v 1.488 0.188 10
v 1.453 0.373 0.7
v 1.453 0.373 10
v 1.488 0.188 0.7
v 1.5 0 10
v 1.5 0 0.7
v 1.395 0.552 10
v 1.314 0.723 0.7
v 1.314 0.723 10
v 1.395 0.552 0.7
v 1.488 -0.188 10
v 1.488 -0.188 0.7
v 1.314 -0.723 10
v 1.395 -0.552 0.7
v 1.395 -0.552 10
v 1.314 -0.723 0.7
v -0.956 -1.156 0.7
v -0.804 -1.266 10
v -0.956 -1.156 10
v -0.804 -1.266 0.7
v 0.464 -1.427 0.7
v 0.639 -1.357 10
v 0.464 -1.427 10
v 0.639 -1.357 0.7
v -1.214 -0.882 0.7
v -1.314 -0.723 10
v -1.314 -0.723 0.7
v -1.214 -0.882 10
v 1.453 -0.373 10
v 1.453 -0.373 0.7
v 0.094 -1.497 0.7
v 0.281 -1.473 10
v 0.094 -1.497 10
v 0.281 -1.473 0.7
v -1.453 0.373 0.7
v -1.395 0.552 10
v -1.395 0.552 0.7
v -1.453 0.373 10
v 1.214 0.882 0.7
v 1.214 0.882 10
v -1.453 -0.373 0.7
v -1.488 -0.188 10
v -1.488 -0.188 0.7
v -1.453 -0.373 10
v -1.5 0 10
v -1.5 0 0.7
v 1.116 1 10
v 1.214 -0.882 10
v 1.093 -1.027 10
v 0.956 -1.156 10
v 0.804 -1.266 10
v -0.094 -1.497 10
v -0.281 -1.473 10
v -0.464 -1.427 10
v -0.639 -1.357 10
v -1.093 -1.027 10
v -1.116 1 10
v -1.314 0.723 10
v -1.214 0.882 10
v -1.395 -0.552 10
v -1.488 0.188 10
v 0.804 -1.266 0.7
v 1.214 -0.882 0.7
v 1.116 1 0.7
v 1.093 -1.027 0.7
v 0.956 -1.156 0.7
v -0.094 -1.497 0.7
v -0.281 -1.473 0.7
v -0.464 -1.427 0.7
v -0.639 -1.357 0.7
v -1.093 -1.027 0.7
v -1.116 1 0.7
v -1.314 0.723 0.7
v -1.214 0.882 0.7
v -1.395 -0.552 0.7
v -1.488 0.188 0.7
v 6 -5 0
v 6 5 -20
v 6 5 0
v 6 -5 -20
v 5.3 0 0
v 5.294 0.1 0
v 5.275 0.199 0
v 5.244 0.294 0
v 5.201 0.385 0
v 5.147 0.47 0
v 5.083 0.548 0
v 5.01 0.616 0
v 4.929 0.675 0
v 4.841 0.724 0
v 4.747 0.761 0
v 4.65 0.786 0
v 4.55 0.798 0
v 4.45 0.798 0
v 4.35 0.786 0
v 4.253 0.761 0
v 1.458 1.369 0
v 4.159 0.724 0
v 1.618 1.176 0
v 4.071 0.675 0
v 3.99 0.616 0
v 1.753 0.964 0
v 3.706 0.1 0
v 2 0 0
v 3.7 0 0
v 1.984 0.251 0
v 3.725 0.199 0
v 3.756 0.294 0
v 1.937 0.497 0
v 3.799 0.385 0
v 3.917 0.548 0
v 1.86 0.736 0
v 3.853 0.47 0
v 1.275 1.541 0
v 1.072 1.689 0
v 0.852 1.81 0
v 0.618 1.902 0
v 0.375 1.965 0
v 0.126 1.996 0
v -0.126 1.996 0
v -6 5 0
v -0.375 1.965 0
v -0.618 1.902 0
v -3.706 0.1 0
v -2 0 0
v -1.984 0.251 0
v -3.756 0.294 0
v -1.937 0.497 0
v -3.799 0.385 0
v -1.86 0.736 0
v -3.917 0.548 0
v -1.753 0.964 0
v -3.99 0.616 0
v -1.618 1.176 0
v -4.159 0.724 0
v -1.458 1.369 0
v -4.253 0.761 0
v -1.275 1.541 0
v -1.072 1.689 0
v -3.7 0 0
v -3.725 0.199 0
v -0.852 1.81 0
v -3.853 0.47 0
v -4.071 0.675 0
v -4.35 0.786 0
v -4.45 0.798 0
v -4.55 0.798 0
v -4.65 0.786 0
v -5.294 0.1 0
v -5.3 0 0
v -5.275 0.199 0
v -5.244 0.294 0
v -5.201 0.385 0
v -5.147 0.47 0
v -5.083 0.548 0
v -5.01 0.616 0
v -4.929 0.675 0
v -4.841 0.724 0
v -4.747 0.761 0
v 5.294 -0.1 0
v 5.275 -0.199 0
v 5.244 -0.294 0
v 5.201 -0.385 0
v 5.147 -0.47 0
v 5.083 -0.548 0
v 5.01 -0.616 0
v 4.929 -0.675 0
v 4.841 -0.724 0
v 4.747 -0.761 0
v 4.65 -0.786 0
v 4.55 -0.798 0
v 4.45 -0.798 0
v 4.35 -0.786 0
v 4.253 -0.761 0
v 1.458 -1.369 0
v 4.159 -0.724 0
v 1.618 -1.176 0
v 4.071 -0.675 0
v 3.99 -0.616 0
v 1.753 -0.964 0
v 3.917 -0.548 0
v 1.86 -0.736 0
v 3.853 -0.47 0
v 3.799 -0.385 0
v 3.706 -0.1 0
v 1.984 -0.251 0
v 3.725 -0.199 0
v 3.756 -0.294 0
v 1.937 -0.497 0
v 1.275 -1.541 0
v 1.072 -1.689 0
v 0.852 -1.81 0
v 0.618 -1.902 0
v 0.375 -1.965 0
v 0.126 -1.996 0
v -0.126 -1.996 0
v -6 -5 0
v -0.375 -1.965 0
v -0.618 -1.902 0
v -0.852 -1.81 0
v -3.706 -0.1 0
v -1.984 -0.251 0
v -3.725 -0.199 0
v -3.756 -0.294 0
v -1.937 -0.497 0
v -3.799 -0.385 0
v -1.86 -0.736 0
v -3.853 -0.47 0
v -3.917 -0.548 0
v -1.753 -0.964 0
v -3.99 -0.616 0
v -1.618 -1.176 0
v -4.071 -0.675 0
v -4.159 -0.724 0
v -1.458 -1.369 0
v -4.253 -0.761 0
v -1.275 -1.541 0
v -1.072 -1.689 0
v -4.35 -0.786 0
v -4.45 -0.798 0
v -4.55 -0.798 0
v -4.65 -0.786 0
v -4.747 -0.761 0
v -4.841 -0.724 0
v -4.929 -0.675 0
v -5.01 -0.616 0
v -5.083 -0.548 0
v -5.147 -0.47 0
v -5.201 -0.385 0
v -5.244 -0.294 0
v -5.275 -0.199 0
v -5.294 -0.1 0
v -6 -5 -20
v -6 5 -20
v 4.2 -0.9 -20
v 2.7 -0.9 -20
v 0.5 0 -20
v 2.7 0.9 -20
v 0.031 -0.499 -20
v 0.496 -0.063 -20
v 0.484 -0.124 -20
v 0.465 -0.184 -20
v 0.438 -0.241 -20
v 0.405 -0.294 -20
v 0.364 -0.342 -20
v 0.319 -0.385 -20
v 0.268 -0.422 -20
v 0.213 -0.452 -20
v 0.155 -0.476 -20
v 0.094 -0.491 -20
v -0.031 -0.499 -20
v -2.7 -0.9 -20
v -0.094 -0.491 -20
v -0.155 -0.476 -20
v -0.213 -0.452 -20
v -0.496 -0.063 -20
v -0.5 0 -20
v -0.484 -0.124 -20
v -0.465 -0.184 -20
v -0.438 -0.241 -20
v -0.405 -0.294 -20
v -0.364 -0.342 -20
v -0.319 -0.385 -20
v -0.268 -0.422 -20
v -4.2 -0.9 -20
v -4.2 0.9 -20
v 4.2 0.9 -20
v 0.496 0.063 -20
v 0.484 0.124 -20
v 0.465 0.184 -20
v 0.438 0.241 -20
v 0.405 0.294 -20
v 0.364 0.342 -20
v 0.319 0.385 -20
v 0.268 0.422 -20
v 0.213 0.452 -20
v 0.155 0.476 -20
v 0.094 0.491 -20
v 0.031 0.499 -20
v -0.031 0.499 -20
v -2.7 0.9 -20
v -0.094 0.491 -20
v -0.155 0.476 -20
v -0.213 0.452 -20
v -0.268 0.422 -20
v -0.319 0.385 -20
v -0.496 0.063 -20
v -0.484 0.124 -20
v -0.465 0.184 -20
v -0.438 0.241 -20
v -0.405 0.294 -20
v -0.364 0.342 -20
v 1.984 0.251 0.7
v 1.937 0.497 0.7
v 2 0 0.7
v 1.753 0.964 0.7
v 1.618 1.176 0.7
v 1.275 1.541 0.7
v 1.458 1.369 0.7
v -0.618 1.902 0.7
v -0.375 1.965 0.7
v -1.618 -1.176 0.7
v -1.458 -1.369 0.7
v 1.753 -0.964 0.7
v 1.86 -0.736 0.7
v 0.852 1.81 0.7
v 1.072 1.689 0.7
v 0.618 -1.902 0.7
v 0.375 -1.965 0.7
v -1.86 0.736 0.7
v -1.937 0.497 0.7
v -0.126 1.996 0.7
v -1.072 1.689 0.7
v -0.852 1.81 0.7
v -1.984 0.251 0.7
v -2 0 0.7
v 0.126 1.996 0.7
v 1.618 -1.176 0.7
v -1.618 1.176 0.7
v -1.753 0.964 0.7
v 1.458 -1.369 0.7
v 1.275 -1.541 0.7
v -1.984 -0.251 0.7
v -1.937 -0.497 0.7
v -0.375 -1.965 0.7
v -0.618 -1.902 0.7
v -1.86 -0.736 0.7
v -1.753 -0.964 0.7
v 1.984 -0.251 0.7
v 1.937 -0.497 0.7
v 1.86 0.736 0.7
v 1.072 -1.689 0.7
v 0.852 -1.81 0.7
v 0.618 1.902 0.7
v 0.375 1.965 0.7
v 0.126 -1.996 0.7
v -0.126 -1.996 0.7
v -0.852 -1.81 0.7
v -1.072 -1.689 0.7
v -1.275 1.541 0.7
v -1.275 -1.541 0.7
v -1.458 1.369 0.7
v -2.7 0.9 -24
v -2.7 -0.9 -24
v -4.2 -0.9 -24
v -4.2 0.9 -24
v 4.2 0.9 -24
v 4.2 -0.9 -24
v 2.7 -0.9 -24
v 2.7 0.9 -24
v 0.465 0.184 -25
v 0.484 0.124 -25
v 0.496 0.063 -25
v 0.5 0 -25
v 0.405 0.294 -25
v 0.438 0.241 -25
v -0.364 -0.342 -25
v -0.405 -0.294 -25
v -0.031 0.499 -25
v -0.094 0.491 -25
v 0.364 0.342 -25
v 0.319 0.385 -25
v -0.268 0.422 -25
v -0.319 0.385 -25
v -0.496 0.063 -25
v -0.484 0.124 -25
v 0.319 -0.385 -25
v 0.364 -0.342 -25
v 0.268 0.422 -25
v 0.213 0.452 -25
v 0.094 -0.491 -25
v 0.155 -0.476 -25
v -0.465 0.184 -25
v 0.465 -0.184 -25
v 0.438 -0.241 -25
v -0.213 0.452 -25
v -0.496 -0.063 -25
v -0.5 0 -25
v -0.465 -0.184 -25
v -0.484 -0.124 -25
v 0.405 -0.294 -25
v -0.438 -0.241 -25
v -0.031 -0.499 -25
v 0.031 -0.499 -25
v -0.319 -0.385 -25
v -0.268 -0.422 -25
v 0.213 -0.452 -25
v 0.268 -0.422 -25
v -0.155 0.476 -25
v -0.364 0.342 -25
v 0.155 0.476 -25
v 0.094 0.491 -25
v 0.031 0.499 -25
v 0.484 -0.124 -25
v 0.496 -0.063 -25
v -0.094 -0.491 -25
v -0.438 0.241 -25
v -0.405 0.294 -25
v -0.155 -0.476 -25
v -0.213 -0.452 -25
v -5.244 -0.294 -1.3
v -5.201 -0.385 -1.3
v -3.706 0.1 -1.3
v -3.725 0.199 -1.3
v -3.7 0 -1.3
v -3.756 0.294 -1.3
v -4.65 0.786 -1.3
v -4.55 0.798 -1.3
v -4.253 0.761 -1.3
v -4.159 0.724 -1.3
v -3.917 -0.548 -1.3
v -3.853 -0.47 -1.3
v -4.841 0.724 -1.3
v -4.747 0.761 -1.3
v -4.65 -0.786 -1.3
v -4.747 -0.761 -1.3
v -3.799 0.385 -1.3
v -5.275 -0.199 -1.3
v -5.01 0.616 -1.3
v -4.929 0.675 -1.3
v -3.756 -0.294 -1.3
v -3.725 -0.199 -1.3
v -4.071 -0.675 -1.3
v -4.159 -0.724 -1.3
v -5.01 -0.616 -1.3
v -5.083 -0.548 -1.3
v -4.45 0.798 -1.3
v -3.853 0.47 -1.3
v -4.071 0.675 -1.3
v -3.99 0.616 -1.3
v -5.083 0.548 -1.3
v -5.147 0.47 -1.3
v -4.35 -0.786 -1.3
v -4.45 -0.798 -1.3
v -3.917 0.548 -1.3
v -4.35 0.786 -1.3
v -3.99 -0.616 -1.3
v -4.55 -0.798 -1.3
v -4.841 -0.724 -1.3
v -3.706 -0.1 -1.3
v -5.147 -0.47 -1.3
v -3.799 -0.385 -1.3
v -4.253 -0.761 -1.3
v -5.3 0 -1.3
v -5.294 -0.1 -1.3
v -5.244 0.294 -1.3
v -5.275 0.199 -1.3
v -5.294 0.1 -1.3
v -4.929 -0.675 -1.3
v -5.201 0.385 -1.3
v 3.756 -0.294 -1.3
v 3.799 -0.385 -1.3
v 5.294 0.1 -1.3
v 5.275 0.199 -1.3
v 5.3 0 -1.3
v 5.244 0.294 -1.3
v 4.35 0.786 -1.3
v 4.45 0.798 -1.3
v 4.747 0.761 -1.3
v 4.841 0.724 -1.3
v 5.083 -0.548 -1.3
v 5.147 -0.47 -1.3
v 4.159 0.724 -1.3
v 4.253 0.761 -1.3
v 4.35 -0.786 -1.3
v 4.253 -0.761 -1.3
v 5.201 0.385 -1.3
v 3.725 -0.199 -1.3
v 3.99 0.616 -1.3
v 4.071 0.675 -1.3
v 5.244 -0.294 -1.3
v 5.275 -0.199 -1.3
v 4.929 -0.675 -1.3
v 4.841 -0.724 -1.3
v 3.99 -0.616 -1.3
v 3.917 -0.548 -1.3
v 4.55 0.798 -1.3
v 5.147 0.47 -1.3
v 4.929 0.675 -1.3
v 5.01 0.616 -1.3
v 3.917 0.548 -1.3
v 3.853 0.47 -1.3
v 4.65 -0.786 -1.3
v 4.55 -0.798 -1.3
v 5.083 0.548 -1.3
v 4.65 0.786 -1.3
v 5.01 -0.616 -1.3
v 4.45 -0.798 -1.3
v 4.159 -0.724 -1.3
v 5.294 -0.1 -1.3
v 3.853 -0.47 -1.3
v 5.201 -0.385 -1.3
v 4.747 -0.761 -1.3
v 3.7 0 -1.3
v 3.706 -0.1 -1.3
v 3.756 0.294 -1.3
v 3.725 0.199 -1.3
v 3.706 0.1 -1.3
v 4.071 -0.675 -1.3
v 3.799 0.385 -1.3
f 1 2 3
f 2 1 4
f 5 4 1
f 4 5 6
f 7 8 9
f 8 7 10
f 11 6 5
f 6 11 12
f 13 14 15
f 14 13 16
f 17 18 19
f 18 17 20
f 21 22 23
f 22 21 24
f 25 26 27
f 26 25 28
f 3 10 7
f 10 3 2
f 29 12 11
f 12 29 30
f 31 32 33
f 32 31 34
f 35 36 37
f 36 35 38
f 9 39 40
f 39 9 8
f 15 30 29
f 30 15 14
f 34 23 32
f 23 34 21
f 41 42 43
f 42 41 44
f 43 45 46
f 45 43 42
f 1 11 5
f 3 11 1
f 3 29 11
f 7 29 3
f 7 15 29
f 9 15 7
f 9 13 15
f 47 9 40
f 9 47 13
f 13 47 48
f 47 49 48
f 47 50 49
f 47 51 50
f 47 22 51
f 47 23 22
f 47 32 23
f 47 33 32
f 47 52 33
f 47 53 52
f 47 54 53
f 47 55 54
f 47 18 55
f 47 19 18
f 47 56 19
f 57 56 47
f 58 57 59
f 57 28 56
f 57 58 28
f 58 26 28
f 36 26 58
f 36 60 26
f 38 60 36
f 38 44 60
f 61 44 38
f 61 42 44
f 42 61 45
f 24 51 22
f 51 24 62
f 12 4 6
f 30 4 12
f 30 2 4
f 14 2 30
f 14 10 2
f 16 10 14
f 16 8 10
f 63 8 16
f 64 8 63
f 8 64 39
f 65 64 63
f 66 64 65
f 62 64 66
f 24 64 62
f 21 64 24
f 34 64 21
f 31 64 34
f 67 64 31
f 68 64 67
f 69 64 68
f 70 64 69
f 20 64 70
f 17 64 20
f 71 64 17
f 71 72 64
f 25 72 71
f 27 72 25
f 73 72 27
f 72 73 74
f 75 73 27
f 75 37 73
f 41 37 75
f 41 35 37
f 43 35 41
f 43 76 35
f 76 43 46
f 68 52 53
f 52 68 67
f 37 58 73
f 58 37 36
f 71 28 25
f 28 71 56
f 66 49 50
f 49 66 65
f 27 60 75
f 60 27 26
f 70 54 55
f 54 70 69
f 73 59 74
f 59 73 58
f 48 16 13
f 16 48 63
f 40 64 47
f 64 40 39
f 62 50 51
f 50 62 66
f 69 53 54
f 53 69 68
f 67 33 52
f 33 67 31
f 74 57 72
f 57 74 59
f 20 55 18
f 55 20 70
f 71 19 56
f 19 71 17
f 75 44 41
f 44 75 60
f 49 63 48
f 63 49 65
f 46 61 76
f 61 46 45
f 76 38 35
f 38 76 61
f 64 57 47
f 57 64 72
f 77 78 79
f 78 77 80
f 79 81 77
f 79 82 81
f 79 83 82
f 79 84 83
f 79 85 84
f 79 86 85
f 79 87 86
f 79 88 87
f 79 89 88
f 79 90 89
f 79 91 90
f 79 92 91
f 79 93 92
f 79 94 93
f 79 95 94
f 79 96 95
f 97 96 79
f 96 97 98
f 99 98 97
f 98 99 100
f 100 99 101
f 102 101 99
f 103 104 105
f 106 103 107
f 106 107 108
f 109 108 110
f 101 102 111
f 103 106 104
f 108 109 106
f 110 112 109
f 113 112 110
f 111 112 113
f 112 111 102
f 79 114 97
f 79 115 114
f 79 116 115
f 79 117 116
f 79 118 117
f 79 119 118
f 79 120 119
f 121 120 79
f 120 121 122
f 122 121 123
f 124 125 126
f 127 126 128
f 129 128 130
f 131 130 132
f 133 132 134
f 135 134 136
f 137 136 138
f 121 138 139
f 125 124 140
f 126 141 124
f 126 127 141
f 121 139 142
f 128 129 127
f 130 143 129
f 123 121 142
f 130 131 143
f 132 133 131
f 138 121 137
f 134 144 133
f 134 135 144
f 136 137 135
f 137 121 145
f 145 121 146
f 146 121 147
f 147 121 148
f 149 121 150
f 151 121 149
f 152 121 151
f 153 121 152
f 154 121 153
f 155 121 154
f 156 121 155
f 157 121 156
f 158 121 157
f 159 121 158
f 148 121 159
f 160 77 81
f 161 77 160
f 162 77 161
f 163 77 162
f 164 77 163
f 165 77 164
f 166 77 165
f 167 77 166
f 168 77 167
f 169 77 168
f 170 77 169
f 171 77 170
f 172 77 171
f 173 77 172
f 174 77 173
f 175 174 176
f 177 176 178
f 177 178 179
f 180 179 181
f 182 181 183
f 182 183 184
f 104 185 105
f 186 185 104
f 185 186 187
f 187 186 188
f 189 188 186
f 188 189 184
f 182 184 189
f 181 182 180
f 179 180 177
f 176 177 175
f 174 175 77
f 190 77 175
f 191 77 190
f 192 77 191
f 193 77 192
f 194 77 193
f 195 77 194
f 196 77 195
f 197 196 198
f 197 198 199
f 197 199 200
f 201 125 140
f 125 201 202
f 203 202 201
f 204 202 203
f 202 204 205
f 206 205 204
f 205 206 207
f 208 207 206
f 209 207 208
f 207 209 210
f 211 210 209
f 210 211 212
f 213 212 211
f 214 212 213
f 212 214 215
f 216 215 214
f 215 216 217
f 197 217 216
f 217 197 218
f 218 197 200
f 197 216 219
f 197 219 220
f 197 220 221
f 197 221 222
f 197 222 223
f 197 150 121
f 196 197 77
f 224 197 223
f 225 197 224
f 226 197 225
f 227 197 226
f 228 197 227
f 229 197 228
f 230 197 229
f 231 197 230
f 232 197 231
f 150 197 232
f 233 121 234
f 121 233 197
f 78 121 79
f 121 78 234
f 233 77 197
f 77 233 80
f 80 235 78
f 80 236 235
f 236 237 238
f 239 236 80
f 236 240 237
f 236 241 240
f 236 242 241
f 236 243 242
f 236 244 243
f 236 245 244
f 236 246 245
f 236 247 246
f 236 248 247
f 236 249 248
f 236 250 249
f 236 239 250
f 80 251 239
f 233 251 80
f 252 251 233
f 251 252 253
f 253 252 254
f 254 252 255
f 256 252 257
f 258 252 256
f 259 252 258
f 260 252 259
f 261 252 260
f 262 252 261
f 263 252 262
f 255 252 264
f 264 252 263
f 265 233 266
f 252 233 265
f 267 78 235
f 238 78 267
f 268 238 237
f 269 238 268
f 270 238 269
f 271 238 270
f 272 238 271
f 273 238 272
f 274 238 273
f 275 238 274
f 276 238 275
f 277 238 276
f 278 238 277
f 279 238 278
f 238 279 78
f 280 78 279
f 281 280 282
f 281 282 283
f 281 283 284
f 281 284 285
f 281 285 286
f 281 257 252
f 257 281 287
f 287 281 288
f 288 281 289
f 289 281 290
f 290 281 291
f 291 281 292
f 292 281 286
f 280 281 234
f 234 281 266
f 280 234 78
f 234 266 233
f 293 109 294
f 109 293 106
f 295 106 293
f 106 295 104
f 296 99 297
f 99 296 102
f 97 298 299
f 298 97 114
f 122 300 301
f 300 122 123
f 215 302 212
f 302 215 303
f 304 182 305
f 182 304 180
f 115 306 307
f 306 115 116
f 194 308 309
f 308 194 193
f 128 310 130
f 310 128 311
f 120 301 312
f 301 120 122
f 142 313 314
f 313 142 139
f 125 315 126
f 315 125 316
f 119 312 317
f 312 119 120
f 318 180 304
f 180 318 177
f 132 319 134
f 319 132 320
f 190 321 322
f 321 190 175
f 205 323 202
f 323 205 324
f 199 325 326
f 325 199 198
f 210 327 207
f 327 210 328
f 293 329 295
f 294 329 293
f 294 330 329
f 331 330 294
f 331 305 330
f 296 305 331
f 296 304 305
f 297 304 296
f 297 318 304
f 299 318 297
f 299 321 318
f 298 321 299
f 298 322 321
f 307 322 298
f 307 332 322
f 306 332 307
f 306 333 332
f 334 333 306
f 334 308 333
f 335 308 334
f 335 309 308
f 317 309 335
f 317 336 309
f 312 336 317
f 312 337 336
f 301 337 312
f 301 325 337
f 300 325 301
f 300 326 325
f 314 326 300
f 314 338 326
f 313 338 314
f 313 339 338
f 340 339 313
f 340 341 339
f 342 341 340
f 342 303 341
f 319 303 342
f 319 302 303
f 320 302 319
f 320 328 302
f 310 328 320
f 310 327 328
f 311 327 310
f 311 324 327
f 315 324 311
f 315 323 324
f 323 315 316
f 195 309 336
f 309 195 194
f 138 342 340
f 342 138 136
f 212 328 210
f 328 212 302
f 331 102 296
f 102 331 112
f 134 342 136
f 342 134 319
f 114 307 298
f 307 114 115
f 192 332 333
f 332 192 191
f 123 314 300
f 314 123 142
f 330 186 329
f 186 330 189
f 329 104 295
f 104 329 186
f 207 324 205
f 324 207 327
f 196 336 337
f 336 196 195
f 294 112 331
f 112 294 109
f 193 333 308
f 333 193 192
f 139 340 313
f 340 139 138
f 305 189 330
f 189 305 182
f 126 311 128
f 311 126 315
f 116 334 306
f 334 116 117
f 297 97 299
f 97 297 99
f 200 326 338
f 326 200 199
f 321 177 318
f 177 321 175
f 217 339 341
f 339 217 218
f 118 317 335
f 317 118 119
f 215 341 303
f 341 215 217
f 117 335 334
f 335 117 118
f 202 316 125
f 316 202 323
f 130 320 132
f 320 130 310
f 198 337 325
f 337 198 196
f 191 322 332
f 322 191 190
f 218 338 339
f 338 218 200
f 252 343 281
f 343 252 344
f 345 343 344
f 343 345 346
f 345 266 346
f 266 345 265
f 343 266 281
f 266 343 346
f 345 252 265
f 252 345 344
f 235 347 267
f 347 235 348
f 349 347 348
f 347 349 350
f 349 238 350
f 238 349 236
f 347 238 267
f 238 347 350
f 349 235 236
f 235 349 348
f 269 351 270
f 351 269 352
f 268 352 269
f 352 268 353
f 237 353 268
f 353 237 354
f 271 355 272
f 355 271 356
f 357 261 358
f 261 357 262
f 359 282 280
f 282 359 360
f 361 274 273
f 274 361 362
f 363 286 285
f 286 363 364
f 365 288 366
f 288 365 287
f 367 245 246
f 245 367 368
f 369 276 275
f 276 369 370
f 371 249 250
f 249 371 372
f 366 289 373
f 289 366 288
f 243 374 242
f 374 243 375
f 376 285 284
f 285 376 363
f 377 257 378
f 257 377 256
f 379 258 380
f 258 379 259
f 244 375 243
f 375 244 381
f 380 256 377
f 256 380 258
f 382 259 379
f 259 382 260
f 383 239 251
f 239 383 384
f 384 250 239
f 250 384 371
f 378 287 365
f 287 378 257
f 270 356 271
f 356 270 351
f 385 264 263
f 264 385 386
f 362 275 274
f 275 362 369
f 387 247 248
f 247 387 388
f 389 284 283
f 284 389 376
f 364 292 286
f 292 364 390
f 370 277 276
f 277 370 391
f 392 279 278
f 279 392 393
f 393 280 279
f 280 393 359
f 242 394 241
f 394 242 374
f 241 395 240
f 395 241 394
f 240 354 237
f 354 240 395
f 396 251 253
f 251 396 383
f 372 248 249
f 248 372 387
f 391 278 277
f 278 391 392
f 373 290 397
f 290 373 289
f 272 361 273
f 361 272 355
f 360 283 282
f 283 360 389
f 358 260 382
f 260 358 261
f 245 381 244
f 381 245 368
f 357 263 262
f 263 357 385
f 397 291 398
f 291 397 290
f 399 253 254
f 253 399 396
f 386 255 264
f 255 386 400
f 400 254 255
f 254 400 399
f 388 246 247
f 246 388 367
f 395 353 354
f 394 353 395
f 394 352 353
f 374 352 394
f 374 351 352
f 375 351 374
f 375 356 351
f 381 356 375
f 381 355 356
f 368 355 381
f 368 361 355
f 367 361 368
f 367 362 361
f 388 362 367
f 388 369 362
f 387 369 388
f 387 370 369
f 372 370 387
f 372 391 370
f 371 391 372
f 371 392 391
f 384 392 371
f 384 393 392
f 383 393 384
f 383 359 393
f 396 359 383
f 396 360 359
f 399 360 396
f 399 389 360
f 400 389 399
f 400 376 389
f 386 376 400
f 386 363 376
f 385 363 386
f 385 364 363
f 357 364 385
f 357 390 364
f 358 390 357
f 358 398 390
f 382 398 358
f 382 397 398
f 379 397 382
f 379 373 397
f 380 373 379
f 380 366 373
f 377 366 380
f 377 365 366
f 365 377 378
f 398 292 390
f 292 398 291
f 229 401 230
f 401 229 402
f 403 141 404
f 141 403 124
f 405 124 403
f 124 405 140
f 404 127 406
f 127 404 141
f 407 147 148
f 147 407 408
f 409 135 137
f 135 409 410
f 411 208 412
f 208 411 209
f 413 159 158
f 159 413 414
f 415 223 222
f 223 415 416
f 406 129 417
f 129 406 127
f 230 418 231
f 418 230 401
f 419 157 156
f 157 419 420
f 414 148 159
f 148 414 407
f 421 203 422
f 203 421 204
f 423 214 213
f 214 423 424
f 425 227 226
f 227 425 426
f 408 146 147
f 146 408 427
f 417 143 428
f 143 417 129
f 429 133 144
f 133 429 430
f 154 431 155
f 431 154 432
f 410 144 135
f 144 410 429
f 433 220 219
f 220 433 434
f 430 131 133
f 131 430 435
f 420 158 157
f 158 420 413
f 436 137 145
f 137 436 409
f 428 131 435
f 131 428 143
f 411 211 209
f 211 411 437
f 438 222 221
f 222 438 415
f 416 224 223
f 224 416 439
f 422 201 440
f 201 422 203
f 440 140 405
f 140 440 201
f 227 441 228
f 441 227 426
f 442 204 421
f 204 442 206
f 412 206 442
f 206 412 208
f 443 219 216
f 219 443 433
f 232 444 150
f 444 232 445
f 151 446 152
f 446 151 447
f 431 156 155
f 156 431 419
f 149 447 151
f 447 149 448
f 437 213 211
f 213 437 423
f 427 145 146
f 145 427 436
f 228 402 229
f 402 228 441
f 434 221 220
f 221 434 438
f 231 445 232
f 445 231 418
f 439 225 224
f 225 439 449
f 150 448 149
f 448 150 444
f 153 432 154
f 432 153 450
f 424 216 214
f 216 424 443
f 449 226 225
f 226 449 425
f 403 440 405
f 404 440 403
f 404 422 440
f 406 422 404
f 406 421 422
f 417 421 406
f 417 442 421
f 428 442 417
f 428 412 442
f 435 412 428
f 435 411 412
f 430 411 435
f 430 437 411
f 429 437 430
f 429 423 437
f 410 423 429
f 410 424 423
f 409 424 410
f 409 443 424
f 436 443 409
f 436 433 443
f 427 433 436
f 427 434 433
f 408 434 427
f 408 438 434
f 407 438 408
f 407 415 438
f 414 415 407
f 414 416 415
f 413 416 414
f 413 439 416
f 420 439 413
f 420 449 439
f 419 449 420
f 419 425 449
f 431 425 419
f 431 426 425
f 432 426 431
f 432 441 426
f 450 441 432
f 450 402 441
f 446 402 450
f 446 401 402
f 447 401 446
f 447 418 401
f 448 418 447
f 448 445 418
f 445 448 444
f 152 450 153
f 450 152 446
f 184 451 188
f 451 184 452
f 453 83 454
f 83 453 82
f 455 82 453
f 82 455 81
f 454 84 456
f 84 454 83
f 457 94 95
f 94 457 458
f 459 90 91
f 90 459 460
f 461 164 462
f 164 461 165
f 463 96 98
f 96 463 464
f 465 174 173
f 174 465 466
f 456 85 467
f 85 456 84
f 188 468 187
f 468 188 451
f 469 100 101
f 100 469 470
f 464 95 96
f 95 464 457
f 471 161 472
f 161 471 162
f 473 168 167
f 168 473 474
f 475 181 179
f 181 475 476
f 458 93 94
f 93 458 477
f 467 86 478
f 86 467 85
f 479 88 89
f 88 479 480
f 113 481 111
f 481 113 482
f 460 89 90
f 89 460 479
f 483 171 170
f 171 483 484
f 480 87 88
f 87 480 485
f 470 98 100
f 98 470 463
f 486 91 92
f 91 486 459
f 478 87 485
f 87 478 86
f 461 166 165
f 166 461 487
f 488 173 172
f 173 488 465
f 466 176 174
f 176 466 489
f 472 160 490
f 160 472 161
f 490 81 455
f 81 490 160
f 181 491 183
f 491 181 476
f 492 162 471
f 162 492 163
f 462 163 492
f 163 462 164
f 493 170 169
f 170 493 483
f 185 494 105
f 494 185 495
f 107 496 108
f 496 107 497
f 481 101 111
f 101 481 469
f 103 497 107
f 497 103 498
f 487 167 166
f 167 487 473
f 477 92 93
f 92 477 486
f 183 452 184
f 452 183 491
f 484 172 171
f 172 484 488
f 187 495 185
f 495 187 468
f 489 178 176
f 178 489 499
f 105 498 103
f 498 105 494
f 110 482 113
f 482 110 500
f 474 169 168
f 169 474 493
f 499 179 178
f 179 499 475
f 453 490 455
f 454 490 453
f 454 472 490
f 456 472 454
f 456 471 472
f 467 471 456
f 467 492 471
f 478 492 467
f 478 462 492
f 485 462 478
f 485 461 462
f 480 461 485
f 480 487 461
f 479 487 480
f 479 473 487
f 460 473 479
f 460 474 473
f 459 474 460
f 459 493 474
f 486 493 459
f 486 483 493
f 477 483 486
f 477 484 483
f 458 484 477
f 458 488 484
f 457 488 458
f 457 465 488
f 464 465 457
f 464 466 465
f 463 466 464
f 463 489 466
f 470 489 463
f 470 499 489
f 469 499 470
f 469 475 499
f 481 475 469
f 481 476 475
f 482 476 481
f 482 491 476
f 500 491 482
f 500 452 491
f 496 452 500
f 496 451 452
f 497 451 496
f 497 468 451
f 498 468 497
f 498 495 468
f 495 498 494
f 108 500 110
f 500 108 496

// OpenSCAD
$fn = 50;

difference() {
	union() {
		translate(v = [0, 0, 0.7]) {
			rotate(a = [0, 0, 0]) {
				difference() {
					union() {
						cylinder(h = 9.3, r = 1.5);
					}
					union() {
						translate(v = [-6.0, 1.0, -1]) {
							cube(size = [12, 12, 11.3]);
						}
					}
				}
			}
		}
		translate(v = [-6.0, -5.0, -9]) {
			cube(size = [12, 10, 9]);
		}
		translate(v = [-6.0, -5.0, -20]) {
			cube(size = [12, 10, 11]);
		}
		cylinder(h = 0.7, r = 2.0);
		translate(v = [-4.2, -0.9, -24]) {
			cube(size = [1.5, 1.8, 4]);
		}
		translate(v = [2.7, -0.9, -24]) {
			cube(size = [1.5, 1.8, 4]);
		}
		translate(v = [0, 0, -25.0]) {
			cylinder(h = 5, r = 0.5);
		}
	}
	union() {
		translate(v = [-4.5, 0, -1.3]) {
			cylinder(h = 1.31, r = 0.8);
		}
		translate(v = [4.5, 0, -1.3]) {
			cylinder(h = 1.31, r = 0.8);
		}
	}
}
